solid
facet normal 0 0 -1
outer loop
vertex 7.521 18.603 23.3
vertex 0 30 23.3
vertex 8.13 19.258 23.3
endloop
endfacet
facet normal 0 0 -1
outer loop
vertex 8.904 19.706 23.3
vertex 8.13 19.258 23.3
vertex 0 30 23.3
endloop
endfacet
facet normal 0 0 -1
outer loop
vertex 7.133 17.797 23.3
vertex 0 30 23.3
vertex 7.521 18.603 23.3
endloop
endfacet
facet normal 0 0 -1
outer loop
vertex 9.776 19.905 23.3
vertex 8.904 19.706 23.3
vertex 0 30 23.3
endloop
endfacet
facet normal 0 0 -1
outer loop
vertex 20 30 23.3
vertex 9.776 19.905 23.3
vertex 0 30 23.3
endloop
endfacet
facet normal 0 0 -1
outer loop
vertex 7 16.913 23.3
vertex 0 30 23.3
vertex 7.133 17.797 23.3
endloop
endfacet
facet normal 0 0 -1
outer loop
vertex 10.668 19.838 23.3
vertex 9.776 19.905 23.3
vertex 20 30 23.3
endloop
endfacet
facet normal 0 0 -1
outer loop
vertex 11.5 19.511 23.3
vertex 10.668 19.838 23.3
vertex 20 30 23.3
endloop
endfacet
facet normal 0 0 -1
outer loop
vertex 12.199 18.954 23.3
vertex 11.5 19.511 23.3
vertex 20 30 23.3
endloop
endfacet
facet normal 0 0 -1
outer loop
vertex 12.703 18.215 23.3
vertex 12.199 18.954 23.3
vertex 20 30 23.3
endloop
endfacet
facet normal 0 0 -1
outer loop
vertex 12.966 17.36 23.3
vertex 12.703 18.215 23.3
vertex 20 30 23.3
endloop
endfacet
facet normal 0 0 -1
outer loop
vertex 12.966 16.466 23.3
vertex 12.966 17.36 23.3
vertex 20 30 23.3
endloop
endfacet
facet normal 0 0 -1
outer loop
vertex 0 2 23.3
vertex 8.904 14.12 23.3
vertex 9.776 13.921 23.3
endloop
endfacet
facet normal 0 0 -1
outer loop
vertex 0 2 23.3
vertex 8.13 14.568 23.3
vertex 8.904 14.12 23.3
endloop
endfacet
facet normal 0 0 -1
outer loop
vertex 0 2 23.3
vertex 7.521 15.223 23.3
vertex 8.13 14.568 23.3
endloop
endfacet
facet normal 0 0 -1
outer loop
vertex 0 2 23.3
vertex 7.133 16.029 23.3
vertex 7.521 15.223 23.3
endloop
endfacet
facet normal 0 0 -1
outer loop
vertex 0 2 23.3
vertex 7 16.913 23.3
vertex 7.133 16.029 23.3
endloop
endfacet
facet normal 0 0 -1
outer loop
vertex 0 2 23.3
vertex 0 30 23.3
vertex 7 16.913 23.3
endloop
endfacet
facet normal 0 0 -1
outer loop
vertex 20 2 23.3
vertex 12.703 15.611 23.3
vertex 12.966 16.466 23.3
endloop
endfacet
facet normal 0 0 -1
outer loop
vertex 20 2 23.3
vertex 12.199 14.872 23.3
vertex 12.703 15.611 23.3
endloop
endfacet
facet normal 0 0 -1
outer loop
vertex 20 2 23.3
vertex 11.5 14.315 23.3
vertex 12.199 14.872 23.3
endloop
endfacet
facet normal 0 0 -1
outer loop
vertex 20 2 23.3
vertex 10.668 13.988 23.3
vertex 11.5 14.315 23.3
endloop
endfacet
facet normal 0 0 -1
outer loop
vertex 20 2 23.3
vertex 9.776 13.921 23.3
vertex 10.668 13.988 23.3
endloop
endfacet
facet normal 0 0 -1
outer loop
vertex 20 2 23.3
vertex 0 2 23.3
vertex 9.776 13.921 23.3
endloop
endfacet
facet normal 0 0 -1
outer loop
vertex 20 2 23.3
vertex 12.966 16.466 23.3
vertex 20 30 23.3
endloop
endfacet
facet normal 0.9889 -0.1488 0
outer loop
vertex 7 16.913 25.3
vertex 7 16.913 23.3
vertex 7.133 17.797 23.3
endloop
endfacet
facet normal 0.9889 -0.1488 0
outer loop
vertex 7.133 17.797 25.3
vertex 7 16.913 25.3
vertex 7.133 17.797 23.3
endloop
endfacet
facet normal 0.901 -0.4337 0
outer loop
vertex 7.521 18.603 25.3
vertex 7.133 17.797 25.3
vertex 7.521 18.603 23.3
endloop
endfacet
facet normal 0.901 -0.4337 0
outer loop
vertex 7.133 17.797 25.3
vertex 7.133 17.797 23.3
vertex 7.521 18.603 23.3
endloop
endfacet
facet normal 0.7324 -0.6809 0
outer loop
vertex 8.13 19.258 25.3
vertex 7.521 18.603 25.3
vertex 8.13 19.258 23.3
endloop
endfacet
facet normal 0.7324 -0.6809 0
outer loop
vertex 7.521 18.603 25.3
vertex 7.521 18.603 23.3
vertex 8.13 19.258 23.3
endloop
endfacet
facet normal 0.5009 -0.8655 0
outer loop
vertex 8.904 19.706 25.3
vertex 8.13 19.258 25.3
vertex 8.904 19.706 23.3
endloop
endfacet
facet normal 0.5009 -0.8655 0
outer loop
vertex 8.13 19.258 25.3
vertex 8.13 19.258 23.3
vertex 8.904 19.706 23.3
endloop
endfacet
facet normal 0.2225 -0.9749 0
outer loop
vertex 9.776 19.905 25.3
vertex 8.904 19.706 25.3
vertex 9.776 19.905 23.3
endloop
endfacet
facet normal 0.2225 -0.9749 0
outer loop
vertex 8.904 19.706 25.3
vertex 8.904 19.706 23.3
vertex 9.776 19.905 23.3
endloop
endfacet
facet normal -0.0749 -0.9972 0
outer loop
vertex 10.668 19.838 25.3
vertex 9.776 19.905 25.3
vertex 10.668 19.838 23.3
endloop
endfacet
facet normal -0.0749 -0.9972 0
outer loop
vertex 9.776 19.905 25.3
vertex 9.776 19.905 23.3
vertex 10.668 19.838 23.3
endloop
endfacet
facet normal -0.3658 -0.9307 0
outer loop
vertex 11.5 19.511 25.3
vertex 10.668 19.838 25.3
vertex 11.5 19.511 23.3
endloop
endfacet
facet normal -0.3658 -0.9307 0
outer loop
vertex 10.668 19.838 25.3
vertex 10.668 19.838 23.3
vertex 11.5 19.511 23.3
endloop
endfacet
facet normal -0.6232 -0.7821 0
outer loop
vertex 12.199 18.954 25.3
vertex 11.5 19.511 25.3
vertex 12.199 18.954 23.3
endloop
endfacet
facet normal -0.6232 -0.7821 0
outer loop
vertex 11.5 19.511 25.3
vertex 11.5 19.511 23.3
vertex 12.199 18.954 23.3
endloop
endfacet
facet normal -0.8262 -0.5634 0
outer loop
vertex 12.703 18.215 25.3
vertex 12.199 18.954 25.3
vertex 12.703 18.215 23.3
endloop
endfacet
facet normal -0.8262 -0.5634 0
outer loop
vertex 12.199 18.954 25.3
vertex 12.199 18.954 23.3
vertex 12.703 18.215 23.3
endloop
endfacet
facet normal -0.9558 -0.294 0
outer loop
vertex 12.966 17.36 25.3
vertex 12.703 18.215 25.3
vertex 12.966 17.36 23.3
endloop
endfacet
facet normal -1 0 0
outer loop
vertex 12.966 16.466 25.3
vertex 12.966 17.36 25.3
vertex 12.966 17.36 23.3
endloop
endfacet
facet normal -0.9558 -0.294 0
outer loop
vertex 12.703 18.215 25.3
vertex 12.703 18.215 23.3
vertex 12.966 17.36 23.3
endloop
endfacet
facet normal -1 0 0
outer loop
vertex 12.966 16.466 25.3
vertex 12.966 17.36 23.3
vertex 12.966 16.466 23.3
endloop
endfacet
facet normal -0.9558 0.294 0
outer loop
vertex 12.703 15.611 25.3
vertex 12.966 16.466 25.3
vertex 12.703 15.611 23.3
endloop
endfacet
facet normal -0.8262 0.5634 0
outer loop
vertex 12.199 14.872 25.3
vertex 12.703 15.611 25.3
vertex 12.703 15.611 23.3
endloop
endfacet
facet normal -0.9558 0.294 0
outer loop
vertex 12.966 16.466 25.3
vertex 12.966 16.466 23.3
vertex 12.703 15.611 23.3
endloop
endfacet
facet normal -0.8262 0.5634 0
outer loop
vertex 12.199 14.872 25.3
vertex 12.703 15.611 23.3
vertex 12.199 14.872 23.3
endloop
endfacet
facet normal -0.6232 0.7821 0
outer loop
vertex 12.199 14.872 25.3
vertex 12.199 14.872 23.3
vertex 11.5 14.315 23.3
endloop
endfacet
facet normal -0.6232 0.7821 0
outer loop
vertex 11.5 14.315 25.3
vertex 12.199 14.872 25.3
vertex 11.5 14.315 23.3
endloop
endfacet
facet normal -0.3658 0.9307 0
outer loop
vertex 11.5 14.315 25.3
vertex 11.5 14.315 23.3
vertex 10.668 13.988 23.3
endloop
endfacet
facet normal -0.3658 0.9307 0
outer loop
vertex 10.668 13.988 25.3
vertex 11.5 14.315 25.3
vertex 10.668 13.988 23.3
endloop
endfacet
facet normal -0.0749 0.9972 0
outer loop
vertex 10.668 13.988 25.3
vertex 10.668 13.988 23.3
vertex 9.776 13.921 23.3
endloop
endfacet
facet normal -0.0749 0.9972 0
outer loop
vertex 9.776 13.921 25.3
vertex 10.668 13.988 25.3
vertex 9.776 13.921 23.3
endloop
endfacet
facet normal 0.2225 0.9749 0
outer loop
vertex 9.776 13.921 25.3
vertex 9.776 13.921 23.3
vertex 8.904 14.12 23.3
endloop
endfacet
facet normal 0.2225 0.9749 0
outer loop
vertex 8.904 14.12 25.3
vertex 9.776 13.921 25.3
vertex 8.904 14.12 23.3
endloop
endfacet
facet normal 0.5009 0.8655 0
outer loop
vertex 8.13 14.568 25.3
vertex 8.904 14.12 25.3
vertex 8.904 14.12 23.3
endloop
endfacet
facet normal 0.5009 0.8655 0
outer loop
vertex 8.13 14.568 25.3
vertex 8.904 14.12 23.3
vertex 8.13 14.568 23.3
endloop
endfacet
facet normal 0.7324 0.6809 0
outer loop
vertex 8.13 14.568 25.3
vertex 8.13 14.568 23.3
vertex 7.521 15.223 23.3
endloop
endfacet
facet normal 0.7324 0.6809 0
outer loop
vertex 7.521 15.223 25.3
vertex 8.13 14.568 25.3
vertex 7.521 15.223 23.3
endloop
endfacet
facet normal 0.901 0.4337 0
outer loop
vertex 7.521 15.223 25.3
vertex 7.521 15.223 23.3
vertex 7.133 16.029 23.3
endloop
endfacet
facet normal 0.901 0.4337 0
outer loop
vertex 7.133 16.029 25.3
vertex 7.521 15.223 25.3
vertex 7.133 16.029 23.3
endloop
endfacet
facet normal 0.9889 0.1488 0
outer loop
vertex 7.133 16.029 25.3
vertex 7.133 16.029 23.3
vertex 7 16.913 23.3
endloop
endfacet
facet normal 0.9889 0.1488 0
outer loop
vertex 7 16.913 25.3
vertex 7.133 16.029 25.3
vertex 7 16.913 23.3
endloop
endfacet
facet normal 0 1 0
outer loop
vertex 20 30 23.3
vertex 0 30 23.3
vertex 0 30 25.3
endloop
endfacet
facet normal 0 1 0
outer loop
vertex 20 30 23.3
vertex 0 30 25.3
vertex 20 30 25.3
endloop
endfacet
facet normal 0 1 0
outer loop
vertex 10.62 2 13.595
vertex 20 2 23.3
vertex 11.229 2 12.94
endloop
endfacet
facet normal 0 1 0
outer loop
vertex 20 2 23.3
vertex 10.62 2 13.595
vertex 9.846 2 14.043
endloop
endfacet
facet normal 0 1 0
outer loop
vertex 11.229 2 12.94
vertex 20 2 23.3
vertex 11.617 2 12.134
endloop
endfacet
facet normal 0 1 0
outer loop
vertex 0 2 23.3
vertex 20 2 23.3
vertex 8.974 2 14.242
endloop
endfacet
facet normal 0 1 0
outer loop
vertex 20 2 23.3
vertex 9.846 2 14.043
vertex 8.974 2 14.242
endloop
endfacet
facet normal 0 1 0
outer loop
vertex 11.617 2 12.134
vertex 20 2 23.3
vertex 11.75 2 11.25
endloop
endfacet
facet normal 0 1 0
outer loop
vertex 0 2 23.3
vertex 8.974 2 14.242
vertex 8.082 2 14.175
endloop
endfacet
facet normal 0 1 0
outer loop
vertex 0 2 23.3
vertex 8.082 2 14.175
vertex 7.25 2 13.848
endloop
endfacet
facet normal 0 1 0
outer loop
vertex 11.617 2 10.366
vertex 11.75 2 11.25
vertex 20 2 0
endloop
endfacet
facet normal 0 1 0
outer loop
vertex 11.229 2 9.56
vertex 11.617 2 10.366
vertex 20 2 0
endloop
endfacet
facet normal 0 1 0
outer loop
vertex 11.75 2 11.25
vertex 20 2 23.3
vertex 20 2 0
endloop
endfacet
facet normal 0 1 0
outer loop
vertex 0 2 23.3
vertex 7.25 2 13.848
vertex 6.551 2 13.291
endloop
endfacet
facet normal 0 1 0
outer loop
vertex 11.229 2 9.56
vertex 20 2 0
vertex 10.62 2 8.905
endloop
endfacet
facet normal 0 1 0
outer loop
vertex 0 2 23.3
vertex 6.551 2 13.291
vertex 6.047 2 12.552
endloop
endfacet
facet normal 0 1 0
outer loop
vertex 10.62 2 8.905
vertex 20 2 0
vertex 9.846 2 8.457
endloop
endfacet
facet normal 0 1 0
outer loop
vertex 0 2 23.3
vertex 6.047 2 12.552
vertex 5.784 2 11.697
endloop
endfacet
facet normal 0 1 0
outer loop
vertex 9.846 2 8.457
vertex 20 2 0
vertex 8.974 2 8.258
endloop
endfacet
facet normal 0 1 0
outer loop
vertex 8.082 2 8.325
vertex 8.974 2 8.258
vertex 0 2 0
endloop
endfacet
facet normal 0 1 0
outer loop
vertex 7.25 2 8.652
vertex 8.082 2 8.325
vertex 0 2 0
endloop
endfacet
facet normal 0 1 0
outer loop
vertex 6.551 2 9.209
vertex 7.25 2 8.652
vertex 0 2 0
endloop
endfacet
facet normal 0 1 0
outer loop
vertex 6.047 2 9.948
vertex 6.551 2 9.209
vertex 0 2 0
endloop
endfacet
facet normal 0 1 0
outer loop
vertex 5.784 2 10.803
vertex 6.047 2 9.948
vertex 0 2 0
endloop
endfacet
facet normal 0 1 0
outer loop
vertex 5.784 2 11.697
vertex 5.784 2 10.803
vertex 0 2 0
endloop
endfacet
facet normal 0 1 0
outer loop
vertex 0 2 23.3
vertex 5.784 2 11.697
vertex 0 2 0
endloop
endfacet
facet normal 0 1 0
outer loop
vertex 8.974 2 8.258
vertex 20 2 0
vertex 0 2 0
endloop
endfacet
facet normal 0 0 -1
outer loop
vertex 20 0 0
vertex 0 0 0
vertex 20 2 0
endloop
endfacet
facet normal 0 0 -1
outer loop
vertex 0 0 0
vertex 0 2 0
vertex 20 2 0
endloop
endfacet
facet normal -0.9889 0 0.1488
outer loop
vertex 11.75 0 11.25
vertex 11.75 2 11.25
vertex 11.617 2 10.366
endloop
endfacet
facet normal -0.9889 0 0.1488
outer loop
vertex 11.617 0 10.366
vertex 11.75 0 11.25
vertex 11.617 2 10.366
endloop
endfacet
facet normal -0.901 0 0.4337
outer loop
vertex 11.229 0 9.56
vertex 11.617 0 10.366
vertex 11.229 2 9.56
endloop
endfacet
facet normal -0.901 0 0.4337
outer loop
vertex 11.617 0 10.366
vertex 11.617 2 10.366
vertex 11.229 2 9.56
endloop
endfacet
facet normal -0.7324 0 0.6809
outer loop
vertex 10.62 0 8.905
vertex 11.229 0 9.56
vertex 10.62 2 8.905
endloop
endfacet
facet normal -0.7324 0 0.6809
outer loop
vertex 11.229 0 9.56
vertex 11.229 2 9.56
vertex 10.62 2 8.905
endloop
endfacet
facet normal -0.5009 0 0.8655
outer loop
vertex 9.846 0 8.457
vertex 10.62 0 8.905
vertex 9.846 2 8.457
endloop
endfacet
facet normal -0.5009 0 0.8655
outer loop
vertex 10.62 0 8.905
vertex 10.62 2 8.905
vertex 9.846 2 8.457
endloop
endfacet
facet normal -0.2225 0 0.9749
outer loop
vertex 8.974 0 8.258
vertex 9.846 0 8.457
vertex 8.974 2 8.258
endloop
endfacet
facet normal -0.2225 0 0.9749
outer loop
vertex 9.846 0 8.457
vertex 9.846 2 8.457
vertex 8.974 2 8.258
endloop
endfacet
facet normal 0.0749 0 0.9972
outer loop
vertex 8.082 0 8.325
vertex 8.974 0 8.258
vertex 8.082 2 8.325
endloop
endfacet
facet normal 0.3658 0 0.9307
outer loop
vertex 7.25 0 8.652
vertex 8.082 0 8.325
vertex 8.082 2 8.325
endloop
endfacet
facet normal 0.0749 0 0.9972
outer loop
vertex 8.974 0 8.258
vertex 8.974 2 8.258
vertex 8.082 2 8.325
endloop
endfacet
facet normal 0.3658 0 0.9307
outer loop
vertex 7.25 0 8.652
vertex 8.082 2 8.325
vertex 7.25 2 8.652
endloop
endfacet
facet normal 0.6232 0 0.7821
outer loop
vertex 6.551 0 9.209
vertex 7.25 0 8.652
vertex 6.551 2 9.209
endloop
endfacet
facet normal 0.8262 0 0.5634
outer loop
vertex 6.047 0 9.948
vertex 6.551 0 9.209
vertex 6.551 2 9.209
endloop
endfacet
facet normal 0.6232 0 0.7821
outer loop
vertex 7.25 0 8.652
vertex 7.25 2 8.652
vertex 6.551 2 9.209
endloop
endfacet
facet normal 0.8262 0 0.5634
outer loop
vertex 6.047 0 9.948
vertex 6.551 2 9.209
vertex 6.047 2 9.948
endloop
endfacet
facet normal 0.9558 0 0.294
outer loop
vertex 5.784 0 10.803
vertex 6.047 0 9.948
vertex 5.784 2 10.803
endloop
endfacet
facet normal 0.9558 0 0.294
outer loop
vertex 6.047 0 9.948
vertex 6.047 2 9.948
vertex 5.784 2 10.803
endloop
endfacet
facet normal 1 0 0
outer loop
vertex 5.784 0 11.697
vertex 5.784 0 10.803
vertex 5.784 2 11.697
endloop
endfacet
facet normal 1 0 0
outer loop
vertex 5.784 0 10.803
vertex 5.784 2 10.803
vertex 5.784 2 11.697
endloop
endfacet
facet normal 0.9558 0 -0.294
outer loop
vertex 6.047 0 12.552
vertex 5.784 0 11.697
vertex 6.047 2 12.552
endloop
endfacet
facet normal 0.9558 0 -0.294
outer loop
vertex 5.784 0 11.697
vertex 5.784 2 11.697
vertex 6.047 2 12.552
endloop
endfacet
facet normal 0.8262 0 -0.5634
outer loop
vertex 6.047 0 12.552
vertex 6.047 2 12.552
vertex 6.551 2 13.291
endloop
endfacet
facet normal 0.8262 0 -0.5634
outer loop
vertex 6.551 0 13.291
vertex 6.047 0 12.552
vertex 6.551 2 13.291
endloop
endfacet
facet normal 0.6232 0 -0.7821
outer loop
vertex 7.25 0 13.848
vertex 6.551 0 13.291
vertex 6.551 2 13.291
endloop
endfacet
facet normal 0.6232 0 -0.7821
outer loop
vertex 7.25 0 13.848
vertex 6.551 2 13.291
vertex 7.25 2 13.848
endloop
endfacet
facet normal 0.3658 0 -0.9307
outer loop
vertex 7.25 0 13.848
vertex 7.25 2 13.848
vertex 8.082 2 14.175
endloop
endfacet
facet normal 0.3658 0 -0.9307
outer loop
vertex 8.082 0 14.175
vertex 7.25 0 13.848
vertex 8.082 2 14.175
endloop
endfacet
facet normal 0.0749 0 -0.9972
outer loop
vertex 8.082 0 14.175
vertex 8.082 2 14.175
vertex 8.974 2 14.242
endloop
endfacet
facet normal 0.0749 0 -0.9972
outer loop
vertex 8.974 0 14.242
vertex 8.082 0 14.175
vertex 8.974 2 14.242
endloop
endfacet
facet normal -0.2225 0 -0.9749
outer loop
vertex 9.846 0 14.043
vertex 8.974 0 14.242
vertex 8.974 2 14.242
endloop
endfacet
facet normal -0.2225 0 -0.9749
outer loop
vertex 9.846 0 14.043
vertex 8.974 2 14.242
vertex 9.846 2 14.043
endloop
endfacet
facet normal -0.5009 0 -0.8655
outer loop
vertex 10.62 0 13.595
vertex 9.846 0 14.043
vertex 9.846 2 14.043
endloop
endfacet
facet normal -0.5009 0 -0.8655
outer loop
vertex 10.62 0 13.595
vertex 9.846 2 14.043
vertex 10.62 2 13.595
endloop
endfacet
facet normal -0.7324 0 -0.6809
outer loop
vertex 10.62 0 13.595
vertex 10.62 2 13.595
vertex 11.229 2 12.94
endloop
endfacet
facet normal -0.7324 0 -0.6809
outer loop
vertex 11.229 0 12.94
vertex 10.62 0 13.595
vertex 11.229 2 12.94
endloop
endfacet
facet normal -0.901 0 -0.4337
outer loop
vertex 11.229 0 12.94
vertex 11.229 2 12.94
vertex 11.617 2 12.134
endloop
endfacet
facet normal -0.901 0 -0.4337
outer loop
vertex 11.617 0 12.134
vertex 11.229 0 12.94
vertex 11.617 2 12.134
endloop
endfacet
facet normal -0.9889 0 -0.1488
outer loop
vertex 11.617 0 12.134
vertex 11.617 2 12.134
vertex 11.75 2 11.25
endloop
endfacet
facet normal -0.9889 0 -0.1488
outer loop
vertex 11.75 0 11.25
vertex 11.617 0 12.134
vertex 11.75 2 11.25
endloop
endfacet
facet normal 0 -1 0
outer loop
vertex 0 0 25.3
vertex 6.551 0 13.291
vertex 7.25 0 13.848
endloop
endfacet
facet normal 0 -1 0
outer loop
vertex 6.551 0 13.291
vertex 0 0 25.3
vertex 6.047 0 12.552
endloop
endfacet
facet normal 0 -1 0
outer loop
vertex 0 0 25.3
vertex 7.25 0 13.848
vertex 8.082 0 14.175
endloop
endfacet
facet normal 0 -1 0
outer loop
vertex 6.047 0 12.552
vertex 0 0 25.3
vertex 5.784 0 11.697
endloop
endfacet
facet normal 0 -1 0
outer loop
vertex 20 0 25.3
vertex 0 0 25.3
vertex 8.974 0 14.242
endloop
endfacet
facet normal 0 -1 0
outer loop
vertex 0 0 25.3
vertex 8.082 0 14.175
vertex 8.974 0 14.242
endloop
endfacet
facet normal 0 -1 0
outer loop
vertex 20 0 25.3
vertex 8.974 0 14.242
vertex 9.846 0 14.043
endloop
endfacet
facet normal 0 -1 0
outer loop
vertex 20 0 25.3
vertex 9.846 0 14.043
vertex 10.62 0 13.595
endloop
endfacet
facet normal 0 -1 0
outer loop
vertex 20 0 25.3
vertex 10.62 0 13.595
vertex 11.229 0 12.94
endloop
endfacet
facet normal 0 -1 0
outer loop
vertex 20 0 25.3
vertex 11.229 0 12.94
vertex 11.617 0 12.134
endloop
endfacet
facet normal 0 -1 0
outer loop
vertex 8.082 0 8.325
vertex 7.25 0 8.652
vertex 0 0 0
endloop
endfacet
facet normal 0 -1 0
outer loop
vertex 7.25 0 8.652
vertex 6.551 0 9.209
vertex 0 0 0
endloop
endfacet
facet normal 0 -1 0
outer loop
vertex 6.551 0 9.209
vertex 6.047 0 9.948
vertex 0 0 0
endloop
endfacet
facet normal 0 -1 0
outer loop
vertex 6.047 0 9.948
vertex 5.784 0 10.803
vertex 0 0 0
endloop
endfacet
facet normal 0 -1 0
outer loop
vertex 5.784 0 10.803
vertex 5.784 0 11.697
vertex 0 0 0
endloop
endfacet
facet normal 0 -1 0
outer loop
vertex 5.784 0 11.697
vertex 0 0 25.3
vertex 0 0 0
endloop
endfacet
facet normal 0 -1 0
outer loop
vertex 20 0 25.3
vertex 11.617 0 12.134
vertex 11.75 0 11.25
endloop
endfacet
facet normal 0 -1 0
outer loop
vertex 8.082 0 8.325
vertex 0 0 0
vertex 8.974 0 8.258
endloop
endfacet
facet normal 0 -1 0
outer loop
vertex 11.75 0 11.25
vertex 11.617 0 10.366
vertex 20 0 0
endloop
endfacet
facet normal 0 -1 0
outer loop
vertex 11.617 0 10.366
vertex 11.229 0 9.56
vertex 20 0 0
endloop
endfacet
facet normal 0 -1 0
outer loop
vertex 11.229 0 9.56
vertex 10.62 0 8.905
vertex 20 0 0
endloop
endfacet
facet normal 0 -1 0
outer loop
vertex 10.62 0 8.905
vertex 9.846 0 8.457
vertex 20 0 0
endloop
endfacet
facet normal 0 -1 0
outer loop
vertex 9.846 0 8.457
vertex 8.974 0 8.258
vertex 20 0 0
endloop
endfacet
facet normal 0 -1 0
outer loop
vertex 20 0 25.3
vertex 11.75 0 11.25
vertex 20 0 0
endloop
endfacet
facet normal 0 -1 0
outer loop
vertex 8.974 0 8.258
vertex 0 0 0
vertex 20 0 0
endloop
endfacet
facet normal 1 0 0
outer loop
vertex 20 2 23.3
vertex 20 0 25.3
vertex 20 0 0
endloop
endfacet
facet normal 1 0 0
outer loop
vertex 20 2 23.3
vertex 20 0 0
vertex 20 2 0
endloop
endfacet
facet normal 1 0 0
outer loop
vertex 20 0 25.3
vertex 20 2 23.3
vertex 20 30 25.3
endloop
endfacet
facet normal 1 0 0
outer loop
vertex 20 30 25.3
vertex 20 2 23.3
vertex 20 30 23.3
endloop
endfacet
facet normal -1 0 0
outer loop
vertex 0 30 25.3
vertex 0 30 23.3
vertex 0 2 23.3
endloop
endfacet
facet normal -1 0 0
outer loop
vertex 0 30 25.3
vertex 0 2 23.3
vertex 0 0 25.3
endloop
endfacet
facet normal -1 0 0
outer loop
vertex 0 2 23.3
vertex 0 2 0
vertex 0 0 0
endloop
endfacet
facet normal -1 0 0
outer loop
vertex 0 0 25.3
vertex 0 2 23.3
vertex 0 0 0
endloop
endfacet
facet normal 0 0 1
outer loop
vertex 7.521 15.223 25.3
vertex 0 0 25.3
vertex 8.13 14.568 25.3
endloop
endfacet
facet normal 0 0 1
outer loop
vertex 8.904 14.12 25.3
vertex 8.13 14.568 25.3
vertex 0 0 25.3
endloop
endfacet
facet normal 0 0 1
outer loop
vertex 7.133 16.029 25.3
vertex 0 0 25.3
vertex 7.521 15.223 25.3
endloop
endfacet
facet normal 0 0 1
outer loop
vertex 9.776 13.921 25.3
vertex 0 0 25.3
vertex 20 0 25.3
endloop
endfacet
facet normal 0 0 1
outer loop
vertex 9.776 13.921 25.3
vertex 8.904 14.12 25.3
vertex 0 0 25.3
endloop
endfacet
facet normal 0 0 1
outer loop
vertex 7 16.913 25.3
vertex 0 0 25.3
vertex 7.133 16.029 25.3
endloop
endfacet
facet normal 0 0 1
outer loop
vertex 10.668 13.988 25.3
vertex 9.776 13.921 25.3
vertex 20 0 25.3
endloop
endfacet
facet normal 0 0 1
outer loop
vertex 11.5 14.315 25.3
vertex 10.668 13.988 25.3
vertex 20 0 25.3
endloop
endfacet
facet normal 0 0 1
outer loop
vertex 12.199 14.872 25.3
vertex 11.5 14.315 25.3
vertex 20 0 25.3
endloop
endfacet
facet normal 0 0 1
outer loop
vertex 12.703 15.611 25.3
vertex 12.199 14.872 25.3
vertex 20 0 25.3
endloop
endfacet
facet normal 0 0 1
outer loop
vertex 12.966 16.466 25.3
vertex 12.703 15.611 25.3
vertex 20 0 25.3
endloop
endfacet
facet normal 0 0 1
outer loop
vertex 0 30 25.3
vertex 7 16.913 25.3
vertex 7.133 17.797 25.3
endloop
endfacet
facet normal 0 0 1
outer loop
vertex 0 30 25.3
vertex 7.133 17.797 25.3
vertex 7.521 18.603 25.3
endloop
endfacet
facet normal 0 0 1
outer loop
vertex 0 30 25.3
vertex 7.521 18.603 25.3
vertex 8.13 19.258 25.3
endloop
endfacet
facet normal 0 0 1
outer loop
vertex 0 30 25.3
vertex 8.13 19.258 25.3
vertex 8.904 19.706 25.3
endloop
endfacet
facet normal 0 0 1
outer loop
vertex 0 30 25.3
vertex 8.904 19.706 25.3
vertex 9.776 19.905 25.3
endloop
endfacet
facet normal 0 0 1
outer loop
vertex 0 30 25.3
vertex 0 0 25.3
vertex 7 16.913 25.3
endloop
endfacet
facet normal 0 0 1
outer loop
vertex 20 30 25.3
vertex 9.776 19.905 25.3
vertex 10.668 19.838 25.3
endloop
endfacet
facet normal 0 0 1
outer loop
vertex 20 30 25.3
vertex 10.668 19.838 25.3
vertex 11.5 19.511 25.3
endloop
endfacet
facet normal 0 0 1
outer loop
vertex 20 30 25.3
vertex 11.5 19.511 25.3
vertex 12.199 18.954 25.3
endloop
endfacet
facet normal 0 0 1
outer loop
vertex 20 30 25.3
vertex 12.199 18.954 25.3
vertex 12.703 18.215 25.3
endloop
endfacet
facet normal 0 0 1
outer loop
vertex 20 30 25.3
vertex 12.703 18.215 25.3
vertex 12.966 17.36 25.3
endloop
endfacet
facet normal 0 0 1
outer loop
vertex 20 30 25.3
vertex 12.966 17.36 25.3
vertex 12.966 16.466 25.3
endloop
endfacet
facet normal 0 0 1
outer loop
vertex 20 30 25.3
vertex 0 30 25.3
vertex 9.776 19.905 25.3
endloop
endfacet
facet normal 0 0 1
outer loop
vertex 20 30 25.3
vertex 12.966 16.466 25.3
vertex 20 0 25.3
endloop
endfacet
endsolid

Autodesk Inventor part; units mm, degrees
ref_plane "YZ Plane" through (0, 0, 0) normal (1, 0, 0) x (0, 1, 0)
ref_plane "XZ Plane" through (0, 0, 0) normal (0, 1, 0) x (-1, 0, 0)
ref_plane "XY Plane" through (0, 0, 0) normal (0, 0, 1) x (1, 0, 0)
sketch "Esboço1" plane through (0, 0, 0) normal (0, 0, 1) x (1, 0, 0)
  line L0 (0, 0) -> (20, 0)
  line L1 (20, 0) -> (20, 2)
  line L2 (20, 2) -> (0, 2)
  line L3 (0, 2) -> (0, 0)
  dimension "d0" = 20
  dimension "d1" = 2
extrude "Extrusão1" add sketch "Esboço1" along normal blind 25.3
sketch "Esboço2" plane through (0, 2, 0) normal (0, 1, 0) x (1, 0, 0)
  line L0 (0, -25.3) -> (20, -25.3) projected
  line L1 (0, 0) -> (0, -25.3) projected
  line L2 (20, -25.3) -> (0, -25.3)
  line L3 (0, -25.3) -> (0, -23.3)
  line L4 (0, -23.3) -> (20, -23.3)
  line L5 (20, -23.3) -> (20, -25.3)
  dimension "d4" = 2
extrude "Extrusão2" add sketch "Esboço2" along normal blind 28
sketch "Esboço3" plane through (0, 2, 0) normal (0, 1, 0) x (1, 0, 0)
  circle A0 centre (8.75, -11.25) radius 3
  line L0 (20, 0) -> (0, 0) projected
  line L1 (0, 0) -> (0, -23.3) projected
  dimension "d7" = 6
  dimension "d8" = 11.25
  dimension "d9" = 8.75
extrude "Extrusão3" cut sketch "Esboço3" against normal blind 28
sketch "Esboço4" plane through (20, 2, 23.3) normal (0, 0, -1) x (-1, 0, 0)
  circle A0 centre (10, 14.913) radius 3
  line L0 (20, 0) -> (20, 28) projected
  line L1 (0, 28) -> (20, 28) projected
  line L2 (0, 0) -> (20, 0) projected
  point P0 (20, -2)
  dimension "d12" = 6
  dimension "d13" = 10
  dimension "d17" = 14.913
extrude "Extrusão4" cut sketch "Esboço4" against normal blind 28
properties part number "Fixador acelerometro dianteiro"
